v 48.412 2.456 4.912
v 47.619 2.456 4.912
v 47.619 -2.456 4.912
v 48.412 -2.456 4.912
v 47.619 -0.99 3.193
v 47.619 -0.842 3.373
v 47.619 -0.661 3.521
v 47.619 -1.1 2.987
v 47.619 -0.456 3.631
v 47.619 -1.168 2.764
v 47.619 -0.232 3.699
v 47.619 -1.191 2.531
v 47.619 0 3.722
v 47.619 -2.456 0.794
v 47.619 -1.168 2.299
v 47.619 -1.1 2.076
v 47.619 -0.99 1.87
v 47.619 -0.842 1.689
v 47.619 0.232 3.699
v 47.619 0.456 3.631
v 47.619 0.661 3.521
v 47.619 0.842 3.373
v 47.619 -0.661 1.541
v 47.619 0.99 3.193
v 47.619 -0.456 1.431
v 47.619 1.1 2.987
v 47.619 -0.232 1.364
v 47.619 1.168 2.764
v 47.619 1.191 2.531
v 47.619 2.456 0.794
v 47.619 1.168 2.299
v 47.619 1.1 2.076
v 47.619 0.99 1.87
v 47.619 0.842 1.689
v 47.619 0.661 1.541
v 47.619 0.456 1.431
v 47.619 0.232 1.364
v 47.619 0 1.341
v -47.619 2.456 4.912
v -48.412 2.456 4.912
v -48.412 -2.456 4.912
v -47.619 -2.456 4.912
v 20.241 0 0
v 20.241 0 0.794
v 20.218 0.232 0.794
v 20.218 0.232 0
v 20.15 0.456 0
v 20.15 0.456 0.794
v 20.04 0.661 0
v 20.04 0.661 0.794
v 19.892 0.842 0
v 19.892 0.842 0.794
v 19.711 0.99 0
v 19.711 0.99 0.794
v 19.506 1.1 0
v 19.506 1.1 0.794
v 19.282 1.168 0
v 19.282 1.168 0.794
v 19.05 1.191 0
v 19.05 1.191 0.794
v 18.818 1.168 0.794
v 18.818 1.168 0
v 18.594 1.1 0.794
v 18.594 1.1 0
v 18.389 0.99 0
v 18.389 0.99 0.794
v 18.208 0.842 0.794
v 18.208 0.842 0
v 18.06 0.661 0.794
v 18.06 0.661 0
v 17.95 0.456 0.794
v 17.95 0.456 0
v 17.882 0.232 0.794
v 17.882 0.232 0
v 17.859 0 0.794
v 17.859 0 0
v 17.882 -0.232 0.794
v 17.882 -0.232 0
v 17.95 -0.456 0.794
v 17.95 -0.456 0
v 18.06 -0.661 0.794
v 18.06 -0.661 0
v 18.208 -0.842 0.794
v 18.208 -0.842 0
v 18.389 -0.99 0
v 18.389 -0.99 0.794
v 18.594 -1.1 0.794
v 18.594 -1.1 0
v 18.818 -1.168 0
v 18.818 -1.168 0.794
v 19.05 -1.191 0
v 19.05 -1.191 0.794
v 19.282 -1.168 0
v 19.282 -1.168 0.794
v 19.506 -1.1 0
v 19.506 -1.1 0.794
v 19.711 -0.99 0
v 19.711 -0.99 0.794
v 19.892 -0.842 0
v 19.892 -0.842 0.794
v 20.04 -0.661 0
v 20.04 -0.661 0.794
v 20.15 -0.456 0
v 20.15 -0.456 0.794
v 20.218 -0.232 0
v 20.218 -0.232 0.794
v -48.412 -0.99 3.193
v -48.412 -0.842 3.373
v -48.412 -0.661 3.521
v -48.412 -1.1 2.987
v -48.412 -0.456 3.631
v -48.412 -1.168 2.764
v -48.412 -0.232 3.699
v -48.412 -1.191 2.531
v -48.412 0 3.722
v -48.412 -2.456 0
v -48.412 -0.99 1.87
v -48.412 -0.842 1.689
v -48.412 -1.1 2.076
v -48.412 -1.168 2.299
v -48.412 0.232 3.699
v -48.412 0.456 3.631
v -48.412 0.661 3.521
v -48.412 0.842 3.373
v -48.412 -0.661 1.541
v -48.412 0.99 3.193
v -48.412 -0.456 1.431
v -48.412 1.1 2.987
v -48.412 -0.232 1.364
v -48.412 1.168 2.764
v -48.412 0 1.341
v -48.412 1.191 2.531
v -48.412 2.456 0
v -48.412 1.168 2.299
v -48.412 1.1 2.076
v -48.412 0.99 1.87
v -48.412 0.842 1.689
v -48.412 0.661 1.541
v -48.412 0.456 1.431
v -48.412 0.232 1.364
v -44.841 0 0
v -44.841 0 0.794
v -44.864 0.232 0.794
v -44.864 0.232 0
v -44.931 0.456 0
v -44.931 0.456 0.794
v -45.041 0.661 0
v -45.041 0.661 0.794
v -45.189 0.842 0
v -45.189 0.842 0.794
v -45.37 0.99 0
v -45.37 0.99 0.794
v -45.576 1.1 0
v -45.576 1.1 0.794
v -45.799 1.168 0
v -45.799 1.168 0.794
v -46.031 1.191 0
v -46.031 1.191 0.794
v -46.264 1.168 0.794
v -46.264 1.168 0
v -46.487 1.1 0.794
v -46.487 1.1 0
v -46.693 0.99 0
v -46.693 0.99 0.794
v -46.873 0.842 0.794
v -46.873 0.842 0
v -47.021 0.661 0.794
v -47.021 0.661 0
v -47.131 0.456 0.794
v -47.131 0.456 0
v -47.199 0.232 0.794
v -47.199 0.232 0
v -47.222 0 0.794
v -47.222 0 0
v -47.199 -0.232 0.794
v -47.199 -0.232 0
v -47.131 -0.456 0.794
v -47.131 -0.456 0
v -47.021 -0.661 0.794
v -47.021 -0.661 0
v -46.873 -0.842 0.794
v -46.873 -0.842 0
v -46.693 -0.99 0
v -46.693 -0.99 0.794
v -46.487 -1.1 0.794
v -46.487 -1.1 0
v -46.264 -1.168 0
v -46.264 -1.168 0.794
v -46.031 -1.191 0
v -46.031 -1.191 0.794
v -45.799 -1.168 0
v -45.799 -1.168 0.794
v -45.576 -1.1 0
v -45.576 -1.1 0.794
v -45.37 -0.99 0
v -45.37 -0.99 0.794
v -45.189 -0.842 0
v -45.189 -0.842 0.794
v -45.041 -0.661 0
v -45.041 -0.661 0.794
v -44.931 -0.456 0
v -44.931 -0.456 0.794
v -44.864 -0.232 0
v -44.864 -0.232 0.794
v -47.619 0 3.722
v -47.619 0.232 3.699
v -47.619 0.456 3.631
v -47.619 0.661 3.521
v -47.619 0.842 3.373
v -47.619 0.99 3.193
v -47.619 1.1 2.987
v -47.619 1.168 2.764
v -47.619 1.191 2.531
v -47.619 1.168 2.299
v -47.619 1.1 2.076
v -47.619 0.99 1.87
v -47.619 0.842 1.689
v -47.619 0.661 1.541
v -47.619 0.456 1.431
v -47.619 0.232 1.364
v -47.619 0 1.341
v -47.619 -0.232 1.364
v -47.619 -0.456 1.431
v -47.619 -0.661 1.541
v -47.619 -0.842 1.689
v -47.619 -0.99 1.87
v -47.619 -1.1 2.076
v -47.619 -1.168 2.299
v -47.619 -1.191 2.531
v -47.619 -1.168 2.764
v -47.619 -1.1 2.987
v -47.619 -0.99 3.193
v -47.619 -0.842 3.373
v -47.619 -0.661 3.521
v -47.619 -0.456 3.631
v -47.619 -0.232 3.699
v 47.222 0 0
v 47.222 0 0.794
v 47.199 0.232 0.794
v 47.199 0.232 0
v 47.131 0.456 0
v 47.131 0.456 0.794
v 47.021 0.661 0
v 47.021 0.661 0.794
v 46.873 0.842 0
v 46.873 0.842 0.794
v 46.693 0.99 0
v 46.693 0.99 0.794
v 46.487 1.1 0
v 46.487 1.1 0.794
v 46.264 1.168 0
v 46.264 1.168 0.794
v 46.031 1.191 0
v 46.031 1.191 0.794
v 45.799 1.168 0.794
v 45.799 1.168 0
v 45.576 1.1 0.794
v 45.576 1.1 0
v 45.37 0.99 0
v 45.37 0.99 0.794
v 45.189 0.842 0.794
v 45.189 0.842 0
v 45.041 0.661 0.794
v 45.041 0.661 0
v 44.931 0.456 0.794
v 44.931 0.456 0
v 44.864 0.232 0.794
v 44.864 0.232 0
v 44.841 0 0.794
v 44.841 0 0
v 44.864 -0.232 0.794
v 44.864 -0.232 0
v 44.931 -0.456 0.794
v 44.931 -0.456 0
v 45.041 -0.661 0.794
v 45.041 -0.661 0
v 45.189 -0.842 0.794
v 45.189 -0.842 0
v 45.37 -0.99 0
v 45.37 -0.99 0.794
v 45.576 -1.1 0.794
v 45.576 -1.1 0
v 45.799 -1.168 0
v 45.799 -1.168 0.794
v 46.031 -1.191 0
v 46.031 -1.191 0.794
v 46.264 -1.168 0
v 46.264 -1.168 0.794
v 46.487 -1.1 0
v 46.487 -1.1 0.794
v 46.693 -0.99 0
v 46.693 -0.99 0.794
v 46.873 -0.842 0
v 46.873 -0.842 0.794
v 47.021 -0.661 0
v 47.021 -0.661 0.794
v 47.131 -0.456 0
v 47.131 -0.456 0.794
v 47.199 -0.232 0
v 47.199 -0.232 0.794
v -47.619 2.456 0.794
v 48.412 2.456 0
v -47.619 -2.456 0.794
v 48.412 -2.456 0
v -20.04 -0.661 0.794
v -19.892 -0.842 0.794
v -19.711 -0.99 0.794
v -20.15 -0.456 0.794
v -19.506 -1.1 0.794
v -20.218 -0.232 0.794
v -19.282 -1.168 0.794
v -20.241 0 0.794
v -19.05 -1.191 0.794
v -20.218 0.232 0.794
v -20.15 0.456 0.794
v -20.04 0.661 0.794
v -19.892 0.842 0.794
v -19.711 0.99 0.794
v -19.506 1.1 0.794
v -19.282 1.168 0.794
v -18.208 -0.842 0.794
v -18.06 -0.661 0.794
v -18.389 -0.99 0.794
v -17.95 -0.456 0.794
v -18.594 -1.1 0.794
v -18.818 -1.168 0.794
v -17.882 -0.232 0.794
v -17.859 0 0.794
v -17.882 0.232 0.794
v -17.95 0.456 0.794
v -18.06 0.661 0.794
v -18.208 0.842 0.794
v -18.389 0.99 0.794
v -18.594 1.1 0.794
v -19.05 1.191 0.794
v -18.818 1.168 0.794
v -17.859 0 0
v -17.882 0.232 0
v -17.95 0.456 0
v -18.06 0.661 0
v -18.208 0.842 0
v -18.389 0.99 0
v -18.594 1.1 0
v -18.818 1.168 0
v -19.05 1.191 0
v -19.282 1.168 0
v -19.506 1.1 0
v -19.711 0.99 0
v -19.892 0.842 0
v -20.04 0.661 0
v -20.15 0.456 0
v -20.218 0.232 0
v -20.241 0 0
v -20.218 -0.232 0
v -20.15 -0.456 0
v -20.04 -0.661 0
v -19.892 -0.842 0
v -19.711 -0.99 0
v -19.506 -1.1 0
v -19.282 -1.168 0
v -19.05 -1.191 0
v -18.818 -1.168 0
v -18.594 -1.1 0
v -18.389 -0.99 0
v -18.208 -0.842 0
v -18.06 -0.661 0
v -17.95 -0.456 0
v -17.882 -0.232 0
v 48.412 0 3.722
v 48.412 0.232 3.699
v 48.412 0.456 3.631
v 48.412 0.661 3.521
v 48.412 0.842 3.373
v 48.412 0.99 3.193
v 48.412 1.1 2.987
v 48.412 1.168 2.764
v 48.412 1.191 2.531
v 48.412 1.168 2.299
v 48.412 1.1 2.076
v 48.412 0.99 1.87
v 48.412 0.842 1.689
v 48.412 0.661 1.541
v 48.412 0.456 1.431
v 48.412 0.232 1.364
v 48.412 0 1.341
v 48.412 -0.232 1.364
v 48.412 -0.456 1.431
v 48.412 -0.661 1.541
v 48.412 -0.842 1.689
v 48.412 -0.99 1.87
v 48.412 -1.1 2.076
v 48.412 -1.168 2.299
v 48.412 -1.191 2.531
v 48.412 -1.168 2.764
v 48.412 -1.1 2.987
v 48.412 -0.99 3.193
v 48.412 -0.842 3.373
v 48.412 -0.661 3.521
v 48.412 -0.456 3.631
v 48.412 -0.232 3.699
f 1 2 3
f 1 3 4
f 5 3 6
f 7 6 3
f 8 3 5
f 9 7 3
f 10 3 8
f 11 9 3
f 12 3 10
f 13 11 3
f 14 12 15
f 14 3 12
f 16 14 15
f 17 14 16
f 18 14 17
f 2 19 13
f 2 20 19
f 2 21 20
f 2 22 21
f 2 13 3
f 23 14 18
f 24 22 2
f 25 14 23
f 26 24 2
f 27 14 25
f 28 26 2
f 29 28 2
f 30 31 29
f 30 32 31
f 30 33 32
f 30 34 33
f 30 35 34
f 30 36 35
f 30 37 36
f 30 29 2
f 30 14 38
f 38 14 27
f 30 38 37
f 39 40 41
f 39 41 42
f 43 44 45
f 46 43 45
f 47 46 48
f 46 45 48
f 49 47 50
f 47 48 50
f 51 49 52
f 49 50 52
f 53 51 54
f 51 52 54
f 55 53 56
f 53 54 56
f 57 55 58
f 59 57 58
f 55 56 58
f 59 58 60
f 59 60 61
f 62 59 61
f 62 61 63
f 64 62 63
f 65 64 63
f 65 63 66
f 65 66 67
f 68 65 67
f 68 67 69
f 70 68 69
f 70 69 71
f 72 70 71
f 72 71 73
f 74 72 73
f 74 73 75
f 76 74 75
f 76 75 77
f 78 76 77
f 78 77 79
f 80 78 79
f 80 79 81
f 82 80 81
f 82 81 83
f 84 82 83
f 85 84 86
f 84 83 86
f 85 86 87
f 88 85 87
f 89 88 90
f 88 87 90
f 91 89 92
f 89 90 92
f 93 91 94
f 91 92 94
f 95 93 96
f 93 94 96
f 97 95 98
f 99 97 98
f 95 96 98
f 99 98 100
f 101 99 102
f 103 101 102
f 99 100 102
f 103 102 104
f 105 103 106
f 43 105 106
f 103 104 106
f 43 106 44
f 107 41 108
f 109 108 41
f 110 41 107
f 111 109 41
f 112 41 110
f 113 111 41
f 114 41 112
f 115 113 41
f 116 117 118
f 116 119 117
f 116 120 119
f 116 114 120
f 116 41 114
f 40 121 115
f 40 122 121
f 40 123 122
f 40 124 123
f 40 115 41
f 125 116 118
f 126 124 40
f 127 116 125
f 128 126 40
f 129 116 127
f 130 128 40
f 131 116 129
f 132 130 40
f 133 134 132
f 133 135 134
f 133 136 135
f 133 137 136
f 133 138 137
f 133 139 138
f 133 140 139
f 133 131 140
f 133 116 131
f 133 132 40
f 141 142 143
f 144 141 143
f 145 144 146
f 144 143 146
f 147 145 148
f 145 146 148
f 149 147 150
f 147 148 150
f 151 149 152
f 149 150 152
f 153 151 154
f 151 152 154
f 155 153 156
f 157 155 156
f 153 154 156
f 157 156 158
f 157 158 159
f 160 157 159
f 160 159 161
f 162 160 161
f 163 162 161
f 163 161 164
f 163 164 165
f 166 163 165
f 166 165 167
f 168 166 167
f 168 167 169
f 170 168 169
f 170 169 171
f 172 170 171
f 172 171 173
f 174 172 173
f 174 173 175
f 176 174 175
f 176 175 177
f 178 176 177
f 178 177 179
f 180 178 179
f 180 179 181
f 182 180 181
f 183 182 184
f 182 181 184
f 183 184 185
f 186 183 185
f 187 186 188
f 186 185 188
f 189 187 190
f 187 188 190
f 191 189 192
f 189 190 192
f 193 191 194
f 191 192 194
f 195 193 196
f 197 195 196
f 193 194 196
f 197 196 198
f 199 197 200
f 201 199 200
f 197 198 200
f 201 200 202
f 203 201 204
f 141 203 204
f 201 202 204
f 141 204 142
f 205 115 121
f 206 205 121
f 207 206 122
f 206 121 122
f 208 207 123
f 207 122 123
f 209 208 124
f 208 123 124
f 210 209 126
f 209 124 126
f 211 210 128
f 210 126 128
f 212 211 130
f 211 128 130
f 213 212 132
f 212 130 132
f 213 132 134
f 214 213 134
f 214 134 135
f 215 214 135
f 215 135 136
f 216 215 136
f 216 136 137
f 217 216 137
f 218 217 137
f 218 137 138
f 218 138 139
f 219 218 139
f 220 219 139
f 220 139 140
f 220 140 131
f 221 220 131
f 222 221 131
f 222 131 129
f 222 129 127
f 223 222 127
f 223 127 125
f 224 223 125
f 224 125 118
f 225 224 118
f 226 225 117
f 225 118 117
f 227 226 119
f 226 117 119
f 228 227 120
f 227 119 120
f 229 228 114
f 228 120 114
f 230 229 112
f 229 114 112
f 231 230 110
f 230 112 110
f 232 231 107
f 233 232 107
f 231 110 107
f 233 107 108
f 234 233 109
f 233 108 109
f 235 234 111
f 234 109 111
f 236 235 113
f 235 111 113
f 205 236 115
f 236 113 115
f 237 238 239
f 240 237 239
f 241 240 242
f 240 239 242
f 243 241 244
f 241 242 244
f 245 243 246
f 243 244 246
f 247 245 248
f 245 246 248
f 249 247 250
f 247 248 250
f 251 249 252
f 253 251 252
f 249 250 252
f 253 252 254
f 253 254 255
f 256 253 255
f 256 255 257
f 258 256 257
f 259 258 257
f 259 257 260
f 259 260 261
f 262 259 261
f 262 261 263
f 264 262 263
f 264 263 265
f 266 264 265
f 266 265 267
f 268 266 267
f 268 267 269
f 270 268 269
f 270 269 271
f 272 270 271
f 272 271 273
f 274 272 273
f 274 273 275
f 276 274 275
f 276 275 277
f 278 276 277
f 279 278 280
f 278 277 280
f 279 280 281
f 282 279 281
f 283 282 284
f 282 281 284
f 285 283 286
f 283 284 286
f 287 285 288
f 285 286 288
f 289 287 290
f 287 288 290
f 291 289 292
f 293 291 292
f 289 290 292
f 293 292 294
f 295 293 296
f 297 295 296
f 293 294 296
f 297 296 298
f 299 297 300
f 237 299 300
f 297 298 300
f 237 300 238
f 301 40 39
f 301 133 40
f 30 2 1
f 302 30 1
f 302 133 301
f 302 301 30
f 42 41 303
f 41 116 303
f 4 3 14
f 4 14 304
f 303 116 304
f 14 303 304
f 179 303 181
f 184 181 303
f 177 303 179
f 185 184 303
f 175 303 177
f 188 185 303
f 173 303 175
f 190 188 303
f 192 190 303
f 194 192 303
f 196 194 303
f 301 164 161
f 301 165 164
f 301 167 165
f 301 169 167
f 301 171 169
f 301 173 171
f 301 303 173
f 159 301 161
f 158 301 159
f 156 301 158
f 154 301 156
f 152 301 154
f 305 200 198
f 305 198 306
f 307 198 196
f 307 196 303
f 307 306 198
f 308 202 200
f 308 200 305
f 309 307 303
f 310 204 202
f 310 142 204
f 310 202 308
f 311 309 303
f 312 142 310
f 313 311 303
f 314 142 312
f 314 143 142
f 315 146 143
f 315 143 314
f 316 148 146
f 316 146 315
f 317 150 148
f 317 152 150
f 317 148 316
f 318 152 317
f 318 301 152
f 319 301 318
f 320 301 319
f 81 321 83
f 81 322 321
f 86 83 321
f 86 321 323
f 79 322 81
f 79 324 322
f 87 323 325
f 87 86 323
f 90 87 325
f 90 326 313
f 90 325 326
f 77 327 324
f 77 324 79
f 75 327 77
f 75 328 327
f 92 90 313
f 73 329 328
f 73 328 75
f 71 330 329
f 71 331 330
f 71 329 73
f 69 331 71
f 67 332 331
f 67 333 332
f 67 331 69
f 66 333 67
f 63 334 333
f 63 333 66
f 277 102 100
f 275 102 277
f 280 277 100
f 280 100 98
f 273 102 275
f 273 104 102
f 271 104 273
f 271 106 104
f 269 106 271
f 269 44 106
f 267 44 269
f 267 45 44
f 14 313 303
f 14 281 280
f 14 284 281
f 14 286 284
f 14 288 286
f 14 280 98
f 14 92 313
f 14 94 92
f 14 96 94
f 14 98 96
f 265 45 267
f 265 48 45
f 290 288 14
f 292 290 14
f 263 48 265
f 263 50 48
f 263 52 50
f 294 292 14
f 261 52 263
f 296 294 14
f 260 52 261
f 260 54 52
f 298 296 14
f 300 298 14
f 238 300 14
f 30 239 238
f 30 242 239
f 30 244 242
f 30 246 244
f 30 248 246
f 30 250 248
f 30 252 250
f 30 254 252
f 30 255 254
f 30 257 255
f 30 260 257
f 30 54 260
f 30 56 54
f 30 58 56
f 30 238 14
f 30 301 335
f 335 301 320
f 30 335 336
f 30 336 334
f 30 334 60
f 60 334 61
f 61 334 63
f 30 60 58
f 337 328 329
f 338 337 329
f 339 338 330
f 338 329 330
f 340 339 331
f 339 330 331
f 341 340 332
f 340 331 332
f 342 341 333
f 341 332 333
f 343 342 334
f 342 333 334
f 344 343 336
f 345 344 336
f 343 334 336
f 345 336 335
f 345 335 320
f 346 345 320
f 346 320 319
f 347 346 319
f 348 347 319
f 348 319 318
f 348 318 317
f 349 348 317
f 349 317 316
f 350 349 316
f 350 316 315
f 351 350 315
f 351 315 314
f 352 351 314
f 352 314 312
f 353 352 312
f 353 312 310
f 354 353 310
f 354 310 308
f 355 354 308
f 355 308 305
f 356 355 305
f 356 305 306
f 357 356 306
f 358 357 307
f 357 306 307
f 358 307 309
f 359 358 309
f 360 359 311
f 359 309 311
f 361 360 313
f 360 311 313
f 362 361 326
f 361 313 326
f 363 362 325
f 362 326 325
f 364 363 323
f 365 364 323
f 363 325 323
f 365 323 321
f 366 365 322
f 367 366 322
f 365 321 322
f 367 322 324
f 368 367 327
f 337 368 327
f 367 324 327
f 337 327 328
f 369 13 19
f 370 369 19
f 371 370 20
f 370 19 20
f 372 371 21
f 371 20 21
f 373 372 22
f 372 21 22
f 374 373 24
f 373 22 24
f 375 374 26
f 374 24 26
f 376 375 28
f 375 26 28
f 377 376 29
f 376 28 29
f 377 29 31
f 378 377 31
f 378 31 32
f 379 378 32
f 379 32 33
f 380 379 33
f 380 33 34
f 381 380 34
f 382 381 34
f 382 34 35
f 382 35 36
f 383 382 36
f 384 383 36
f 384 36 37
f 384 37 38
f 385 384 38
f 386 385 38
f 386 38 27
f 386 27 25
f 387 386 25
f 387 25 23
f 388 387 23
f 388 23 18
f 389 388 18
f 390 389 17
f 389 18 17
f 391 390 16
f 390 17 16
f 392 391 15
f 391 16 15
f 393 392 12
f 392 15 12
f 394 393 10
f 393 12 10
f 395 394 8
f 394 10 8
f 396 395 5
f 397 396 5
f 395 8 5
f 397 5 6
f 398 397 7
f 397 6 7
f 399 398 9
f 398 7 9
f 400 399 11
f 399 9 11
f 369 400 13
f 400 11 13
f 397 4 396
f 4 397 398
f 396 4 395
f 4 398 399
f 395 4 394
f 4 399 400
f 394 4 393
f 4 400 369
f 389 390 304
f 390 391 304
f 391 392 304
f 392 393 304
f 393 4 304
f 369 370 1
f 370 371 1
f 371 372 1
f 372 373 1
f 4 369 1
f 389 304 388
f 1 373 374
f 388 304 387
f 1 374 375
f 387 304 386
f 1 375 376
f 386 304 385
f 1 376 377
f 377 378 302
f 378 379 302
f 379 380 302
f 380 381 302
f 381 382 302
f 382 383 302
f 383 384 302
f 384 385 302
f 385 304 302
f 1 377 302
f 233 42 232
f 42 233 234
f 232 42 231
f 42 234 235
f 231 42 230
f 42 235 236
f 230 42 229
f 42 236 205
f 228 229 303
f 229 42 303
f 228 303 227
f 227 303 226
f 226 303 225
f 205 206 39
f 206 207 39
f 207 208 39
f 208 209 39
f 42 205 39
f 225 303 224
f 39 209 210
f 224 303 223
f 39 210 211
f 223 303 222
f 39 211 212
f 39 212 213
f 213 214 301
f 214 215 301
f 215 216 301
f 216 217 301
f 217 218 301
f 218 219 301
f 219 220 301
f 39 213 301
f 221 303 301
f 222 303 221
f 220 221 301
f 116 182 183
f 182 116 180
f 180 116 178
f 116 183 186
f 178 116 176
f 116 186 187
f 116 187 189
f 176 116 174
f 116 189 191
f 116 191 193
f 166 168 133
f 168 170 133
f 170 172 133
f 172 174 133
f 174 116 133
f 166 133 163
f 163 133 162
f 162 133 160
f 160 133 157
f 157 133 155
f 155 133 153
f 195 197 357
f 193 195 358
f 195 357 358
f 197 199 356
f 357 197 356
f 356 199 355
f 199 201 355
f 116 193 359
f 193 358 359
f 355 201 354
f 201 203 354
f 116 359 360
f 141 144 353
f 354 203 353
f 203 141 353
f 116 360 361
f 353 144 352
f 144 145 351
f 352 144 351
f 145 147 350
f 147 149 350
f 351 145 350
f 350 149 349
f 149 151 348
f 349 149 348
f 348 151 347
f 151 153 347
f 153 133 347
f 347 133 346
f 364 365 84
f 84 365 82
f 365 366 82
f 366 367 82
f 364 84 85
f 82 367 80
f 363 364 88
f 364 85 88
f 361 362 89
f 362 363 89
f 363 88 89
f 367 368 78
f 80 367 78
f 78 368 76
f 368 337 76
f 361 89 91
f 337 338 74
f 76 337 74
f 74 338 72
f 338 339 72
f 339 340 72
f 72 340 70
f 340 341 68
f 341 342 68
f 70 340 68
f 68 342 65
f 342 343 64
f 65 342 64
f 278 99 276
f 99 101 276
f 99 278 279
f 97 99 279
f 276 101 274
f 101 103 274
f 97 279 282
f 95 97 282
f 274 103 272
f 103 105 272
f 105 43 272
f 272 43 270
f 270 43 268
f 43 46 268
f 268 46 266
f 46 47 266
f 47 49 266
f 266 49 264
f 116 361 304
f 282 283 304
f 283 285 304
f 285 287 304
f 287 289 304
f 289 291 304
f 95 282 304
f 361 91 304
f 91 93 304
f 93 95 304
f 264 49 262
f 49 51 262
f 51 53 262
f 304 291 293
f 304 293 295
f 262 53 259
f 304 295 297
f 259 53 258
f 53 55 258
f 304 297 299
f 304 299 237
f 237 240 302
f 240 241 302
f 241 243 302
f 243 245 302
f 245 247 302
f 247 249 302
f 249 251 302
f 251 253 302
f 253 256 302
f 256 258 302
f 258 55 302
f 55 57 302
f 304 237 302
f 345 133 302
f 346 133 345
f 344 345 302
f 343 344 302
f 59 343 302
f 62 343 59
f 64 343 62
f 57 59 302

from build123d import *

# Parameters (mm, degrees)
SKETCH1_W           = 96.825
SKETCH1_H           = 4.9125
BOSS_EXTRUDE1_DEPTH = 4.9125
SHELL1_T            = -0.79375
SKETCH2_R           = 1.190625
CUT_EXTRUDE1_DEPTH  = 49.649433932
SKETCH3_R           = 1.190625
CUT_EXTRUDE2_DEPTH  = 97.98064985


with BuildPart() as part:
    # Sketch1 → Boss-Extrude1 (new body)
    with BuildSketch(Plane.XY):
        Rectangle(SKETCH1_W, SKETCH1_H)
    extrude(amount=BOSS_EXTRUDE1_DEPTH)

    # Shell1
    shell1_openings = [part.faces().sort_by_distance(p)[0] for p in [
        (0, 0, 4.9125),
        (0, -2.45625, 2.45625),
        (0, 2.45625, 2.45625),
    ]]
    offset(amount=SHELL1_T, openings=shell1_openings, kind=Kind.INTERSECTION)

    # Sketch2 → Cut-Extrude1 (cut, through all)
    with BuildSketch(Plane.XY.offset(0.79375)):
        with Locations((-46.03125, 0)):
            Circle(SKETCH2_R)
        with Locations((-19.05, 0)):
            Circle(SKETCH2_R)
        with Locations((19.05, 0)):
            Circle(SKETCH2_R)
        with Locations((46.03125, 0)):
            Circle(SKETCH2_R)
    extrude(amount=-CUT_EXTRUDE1_DEPTH, mode=Mode.SUBTRACT)

    # Sketch3 → Cut-Extrude2 (cut, through all)
    with BuildSketch(Plane.ZY.offset(48.4125)):
        with Locations((2.53125, 0)):
            Circle(SKETCH3_R)
    extrude(amount=-CUT_EXTRUDE2_DEPTH, mode=Mode.SUBTRACT)


solid = part.part
